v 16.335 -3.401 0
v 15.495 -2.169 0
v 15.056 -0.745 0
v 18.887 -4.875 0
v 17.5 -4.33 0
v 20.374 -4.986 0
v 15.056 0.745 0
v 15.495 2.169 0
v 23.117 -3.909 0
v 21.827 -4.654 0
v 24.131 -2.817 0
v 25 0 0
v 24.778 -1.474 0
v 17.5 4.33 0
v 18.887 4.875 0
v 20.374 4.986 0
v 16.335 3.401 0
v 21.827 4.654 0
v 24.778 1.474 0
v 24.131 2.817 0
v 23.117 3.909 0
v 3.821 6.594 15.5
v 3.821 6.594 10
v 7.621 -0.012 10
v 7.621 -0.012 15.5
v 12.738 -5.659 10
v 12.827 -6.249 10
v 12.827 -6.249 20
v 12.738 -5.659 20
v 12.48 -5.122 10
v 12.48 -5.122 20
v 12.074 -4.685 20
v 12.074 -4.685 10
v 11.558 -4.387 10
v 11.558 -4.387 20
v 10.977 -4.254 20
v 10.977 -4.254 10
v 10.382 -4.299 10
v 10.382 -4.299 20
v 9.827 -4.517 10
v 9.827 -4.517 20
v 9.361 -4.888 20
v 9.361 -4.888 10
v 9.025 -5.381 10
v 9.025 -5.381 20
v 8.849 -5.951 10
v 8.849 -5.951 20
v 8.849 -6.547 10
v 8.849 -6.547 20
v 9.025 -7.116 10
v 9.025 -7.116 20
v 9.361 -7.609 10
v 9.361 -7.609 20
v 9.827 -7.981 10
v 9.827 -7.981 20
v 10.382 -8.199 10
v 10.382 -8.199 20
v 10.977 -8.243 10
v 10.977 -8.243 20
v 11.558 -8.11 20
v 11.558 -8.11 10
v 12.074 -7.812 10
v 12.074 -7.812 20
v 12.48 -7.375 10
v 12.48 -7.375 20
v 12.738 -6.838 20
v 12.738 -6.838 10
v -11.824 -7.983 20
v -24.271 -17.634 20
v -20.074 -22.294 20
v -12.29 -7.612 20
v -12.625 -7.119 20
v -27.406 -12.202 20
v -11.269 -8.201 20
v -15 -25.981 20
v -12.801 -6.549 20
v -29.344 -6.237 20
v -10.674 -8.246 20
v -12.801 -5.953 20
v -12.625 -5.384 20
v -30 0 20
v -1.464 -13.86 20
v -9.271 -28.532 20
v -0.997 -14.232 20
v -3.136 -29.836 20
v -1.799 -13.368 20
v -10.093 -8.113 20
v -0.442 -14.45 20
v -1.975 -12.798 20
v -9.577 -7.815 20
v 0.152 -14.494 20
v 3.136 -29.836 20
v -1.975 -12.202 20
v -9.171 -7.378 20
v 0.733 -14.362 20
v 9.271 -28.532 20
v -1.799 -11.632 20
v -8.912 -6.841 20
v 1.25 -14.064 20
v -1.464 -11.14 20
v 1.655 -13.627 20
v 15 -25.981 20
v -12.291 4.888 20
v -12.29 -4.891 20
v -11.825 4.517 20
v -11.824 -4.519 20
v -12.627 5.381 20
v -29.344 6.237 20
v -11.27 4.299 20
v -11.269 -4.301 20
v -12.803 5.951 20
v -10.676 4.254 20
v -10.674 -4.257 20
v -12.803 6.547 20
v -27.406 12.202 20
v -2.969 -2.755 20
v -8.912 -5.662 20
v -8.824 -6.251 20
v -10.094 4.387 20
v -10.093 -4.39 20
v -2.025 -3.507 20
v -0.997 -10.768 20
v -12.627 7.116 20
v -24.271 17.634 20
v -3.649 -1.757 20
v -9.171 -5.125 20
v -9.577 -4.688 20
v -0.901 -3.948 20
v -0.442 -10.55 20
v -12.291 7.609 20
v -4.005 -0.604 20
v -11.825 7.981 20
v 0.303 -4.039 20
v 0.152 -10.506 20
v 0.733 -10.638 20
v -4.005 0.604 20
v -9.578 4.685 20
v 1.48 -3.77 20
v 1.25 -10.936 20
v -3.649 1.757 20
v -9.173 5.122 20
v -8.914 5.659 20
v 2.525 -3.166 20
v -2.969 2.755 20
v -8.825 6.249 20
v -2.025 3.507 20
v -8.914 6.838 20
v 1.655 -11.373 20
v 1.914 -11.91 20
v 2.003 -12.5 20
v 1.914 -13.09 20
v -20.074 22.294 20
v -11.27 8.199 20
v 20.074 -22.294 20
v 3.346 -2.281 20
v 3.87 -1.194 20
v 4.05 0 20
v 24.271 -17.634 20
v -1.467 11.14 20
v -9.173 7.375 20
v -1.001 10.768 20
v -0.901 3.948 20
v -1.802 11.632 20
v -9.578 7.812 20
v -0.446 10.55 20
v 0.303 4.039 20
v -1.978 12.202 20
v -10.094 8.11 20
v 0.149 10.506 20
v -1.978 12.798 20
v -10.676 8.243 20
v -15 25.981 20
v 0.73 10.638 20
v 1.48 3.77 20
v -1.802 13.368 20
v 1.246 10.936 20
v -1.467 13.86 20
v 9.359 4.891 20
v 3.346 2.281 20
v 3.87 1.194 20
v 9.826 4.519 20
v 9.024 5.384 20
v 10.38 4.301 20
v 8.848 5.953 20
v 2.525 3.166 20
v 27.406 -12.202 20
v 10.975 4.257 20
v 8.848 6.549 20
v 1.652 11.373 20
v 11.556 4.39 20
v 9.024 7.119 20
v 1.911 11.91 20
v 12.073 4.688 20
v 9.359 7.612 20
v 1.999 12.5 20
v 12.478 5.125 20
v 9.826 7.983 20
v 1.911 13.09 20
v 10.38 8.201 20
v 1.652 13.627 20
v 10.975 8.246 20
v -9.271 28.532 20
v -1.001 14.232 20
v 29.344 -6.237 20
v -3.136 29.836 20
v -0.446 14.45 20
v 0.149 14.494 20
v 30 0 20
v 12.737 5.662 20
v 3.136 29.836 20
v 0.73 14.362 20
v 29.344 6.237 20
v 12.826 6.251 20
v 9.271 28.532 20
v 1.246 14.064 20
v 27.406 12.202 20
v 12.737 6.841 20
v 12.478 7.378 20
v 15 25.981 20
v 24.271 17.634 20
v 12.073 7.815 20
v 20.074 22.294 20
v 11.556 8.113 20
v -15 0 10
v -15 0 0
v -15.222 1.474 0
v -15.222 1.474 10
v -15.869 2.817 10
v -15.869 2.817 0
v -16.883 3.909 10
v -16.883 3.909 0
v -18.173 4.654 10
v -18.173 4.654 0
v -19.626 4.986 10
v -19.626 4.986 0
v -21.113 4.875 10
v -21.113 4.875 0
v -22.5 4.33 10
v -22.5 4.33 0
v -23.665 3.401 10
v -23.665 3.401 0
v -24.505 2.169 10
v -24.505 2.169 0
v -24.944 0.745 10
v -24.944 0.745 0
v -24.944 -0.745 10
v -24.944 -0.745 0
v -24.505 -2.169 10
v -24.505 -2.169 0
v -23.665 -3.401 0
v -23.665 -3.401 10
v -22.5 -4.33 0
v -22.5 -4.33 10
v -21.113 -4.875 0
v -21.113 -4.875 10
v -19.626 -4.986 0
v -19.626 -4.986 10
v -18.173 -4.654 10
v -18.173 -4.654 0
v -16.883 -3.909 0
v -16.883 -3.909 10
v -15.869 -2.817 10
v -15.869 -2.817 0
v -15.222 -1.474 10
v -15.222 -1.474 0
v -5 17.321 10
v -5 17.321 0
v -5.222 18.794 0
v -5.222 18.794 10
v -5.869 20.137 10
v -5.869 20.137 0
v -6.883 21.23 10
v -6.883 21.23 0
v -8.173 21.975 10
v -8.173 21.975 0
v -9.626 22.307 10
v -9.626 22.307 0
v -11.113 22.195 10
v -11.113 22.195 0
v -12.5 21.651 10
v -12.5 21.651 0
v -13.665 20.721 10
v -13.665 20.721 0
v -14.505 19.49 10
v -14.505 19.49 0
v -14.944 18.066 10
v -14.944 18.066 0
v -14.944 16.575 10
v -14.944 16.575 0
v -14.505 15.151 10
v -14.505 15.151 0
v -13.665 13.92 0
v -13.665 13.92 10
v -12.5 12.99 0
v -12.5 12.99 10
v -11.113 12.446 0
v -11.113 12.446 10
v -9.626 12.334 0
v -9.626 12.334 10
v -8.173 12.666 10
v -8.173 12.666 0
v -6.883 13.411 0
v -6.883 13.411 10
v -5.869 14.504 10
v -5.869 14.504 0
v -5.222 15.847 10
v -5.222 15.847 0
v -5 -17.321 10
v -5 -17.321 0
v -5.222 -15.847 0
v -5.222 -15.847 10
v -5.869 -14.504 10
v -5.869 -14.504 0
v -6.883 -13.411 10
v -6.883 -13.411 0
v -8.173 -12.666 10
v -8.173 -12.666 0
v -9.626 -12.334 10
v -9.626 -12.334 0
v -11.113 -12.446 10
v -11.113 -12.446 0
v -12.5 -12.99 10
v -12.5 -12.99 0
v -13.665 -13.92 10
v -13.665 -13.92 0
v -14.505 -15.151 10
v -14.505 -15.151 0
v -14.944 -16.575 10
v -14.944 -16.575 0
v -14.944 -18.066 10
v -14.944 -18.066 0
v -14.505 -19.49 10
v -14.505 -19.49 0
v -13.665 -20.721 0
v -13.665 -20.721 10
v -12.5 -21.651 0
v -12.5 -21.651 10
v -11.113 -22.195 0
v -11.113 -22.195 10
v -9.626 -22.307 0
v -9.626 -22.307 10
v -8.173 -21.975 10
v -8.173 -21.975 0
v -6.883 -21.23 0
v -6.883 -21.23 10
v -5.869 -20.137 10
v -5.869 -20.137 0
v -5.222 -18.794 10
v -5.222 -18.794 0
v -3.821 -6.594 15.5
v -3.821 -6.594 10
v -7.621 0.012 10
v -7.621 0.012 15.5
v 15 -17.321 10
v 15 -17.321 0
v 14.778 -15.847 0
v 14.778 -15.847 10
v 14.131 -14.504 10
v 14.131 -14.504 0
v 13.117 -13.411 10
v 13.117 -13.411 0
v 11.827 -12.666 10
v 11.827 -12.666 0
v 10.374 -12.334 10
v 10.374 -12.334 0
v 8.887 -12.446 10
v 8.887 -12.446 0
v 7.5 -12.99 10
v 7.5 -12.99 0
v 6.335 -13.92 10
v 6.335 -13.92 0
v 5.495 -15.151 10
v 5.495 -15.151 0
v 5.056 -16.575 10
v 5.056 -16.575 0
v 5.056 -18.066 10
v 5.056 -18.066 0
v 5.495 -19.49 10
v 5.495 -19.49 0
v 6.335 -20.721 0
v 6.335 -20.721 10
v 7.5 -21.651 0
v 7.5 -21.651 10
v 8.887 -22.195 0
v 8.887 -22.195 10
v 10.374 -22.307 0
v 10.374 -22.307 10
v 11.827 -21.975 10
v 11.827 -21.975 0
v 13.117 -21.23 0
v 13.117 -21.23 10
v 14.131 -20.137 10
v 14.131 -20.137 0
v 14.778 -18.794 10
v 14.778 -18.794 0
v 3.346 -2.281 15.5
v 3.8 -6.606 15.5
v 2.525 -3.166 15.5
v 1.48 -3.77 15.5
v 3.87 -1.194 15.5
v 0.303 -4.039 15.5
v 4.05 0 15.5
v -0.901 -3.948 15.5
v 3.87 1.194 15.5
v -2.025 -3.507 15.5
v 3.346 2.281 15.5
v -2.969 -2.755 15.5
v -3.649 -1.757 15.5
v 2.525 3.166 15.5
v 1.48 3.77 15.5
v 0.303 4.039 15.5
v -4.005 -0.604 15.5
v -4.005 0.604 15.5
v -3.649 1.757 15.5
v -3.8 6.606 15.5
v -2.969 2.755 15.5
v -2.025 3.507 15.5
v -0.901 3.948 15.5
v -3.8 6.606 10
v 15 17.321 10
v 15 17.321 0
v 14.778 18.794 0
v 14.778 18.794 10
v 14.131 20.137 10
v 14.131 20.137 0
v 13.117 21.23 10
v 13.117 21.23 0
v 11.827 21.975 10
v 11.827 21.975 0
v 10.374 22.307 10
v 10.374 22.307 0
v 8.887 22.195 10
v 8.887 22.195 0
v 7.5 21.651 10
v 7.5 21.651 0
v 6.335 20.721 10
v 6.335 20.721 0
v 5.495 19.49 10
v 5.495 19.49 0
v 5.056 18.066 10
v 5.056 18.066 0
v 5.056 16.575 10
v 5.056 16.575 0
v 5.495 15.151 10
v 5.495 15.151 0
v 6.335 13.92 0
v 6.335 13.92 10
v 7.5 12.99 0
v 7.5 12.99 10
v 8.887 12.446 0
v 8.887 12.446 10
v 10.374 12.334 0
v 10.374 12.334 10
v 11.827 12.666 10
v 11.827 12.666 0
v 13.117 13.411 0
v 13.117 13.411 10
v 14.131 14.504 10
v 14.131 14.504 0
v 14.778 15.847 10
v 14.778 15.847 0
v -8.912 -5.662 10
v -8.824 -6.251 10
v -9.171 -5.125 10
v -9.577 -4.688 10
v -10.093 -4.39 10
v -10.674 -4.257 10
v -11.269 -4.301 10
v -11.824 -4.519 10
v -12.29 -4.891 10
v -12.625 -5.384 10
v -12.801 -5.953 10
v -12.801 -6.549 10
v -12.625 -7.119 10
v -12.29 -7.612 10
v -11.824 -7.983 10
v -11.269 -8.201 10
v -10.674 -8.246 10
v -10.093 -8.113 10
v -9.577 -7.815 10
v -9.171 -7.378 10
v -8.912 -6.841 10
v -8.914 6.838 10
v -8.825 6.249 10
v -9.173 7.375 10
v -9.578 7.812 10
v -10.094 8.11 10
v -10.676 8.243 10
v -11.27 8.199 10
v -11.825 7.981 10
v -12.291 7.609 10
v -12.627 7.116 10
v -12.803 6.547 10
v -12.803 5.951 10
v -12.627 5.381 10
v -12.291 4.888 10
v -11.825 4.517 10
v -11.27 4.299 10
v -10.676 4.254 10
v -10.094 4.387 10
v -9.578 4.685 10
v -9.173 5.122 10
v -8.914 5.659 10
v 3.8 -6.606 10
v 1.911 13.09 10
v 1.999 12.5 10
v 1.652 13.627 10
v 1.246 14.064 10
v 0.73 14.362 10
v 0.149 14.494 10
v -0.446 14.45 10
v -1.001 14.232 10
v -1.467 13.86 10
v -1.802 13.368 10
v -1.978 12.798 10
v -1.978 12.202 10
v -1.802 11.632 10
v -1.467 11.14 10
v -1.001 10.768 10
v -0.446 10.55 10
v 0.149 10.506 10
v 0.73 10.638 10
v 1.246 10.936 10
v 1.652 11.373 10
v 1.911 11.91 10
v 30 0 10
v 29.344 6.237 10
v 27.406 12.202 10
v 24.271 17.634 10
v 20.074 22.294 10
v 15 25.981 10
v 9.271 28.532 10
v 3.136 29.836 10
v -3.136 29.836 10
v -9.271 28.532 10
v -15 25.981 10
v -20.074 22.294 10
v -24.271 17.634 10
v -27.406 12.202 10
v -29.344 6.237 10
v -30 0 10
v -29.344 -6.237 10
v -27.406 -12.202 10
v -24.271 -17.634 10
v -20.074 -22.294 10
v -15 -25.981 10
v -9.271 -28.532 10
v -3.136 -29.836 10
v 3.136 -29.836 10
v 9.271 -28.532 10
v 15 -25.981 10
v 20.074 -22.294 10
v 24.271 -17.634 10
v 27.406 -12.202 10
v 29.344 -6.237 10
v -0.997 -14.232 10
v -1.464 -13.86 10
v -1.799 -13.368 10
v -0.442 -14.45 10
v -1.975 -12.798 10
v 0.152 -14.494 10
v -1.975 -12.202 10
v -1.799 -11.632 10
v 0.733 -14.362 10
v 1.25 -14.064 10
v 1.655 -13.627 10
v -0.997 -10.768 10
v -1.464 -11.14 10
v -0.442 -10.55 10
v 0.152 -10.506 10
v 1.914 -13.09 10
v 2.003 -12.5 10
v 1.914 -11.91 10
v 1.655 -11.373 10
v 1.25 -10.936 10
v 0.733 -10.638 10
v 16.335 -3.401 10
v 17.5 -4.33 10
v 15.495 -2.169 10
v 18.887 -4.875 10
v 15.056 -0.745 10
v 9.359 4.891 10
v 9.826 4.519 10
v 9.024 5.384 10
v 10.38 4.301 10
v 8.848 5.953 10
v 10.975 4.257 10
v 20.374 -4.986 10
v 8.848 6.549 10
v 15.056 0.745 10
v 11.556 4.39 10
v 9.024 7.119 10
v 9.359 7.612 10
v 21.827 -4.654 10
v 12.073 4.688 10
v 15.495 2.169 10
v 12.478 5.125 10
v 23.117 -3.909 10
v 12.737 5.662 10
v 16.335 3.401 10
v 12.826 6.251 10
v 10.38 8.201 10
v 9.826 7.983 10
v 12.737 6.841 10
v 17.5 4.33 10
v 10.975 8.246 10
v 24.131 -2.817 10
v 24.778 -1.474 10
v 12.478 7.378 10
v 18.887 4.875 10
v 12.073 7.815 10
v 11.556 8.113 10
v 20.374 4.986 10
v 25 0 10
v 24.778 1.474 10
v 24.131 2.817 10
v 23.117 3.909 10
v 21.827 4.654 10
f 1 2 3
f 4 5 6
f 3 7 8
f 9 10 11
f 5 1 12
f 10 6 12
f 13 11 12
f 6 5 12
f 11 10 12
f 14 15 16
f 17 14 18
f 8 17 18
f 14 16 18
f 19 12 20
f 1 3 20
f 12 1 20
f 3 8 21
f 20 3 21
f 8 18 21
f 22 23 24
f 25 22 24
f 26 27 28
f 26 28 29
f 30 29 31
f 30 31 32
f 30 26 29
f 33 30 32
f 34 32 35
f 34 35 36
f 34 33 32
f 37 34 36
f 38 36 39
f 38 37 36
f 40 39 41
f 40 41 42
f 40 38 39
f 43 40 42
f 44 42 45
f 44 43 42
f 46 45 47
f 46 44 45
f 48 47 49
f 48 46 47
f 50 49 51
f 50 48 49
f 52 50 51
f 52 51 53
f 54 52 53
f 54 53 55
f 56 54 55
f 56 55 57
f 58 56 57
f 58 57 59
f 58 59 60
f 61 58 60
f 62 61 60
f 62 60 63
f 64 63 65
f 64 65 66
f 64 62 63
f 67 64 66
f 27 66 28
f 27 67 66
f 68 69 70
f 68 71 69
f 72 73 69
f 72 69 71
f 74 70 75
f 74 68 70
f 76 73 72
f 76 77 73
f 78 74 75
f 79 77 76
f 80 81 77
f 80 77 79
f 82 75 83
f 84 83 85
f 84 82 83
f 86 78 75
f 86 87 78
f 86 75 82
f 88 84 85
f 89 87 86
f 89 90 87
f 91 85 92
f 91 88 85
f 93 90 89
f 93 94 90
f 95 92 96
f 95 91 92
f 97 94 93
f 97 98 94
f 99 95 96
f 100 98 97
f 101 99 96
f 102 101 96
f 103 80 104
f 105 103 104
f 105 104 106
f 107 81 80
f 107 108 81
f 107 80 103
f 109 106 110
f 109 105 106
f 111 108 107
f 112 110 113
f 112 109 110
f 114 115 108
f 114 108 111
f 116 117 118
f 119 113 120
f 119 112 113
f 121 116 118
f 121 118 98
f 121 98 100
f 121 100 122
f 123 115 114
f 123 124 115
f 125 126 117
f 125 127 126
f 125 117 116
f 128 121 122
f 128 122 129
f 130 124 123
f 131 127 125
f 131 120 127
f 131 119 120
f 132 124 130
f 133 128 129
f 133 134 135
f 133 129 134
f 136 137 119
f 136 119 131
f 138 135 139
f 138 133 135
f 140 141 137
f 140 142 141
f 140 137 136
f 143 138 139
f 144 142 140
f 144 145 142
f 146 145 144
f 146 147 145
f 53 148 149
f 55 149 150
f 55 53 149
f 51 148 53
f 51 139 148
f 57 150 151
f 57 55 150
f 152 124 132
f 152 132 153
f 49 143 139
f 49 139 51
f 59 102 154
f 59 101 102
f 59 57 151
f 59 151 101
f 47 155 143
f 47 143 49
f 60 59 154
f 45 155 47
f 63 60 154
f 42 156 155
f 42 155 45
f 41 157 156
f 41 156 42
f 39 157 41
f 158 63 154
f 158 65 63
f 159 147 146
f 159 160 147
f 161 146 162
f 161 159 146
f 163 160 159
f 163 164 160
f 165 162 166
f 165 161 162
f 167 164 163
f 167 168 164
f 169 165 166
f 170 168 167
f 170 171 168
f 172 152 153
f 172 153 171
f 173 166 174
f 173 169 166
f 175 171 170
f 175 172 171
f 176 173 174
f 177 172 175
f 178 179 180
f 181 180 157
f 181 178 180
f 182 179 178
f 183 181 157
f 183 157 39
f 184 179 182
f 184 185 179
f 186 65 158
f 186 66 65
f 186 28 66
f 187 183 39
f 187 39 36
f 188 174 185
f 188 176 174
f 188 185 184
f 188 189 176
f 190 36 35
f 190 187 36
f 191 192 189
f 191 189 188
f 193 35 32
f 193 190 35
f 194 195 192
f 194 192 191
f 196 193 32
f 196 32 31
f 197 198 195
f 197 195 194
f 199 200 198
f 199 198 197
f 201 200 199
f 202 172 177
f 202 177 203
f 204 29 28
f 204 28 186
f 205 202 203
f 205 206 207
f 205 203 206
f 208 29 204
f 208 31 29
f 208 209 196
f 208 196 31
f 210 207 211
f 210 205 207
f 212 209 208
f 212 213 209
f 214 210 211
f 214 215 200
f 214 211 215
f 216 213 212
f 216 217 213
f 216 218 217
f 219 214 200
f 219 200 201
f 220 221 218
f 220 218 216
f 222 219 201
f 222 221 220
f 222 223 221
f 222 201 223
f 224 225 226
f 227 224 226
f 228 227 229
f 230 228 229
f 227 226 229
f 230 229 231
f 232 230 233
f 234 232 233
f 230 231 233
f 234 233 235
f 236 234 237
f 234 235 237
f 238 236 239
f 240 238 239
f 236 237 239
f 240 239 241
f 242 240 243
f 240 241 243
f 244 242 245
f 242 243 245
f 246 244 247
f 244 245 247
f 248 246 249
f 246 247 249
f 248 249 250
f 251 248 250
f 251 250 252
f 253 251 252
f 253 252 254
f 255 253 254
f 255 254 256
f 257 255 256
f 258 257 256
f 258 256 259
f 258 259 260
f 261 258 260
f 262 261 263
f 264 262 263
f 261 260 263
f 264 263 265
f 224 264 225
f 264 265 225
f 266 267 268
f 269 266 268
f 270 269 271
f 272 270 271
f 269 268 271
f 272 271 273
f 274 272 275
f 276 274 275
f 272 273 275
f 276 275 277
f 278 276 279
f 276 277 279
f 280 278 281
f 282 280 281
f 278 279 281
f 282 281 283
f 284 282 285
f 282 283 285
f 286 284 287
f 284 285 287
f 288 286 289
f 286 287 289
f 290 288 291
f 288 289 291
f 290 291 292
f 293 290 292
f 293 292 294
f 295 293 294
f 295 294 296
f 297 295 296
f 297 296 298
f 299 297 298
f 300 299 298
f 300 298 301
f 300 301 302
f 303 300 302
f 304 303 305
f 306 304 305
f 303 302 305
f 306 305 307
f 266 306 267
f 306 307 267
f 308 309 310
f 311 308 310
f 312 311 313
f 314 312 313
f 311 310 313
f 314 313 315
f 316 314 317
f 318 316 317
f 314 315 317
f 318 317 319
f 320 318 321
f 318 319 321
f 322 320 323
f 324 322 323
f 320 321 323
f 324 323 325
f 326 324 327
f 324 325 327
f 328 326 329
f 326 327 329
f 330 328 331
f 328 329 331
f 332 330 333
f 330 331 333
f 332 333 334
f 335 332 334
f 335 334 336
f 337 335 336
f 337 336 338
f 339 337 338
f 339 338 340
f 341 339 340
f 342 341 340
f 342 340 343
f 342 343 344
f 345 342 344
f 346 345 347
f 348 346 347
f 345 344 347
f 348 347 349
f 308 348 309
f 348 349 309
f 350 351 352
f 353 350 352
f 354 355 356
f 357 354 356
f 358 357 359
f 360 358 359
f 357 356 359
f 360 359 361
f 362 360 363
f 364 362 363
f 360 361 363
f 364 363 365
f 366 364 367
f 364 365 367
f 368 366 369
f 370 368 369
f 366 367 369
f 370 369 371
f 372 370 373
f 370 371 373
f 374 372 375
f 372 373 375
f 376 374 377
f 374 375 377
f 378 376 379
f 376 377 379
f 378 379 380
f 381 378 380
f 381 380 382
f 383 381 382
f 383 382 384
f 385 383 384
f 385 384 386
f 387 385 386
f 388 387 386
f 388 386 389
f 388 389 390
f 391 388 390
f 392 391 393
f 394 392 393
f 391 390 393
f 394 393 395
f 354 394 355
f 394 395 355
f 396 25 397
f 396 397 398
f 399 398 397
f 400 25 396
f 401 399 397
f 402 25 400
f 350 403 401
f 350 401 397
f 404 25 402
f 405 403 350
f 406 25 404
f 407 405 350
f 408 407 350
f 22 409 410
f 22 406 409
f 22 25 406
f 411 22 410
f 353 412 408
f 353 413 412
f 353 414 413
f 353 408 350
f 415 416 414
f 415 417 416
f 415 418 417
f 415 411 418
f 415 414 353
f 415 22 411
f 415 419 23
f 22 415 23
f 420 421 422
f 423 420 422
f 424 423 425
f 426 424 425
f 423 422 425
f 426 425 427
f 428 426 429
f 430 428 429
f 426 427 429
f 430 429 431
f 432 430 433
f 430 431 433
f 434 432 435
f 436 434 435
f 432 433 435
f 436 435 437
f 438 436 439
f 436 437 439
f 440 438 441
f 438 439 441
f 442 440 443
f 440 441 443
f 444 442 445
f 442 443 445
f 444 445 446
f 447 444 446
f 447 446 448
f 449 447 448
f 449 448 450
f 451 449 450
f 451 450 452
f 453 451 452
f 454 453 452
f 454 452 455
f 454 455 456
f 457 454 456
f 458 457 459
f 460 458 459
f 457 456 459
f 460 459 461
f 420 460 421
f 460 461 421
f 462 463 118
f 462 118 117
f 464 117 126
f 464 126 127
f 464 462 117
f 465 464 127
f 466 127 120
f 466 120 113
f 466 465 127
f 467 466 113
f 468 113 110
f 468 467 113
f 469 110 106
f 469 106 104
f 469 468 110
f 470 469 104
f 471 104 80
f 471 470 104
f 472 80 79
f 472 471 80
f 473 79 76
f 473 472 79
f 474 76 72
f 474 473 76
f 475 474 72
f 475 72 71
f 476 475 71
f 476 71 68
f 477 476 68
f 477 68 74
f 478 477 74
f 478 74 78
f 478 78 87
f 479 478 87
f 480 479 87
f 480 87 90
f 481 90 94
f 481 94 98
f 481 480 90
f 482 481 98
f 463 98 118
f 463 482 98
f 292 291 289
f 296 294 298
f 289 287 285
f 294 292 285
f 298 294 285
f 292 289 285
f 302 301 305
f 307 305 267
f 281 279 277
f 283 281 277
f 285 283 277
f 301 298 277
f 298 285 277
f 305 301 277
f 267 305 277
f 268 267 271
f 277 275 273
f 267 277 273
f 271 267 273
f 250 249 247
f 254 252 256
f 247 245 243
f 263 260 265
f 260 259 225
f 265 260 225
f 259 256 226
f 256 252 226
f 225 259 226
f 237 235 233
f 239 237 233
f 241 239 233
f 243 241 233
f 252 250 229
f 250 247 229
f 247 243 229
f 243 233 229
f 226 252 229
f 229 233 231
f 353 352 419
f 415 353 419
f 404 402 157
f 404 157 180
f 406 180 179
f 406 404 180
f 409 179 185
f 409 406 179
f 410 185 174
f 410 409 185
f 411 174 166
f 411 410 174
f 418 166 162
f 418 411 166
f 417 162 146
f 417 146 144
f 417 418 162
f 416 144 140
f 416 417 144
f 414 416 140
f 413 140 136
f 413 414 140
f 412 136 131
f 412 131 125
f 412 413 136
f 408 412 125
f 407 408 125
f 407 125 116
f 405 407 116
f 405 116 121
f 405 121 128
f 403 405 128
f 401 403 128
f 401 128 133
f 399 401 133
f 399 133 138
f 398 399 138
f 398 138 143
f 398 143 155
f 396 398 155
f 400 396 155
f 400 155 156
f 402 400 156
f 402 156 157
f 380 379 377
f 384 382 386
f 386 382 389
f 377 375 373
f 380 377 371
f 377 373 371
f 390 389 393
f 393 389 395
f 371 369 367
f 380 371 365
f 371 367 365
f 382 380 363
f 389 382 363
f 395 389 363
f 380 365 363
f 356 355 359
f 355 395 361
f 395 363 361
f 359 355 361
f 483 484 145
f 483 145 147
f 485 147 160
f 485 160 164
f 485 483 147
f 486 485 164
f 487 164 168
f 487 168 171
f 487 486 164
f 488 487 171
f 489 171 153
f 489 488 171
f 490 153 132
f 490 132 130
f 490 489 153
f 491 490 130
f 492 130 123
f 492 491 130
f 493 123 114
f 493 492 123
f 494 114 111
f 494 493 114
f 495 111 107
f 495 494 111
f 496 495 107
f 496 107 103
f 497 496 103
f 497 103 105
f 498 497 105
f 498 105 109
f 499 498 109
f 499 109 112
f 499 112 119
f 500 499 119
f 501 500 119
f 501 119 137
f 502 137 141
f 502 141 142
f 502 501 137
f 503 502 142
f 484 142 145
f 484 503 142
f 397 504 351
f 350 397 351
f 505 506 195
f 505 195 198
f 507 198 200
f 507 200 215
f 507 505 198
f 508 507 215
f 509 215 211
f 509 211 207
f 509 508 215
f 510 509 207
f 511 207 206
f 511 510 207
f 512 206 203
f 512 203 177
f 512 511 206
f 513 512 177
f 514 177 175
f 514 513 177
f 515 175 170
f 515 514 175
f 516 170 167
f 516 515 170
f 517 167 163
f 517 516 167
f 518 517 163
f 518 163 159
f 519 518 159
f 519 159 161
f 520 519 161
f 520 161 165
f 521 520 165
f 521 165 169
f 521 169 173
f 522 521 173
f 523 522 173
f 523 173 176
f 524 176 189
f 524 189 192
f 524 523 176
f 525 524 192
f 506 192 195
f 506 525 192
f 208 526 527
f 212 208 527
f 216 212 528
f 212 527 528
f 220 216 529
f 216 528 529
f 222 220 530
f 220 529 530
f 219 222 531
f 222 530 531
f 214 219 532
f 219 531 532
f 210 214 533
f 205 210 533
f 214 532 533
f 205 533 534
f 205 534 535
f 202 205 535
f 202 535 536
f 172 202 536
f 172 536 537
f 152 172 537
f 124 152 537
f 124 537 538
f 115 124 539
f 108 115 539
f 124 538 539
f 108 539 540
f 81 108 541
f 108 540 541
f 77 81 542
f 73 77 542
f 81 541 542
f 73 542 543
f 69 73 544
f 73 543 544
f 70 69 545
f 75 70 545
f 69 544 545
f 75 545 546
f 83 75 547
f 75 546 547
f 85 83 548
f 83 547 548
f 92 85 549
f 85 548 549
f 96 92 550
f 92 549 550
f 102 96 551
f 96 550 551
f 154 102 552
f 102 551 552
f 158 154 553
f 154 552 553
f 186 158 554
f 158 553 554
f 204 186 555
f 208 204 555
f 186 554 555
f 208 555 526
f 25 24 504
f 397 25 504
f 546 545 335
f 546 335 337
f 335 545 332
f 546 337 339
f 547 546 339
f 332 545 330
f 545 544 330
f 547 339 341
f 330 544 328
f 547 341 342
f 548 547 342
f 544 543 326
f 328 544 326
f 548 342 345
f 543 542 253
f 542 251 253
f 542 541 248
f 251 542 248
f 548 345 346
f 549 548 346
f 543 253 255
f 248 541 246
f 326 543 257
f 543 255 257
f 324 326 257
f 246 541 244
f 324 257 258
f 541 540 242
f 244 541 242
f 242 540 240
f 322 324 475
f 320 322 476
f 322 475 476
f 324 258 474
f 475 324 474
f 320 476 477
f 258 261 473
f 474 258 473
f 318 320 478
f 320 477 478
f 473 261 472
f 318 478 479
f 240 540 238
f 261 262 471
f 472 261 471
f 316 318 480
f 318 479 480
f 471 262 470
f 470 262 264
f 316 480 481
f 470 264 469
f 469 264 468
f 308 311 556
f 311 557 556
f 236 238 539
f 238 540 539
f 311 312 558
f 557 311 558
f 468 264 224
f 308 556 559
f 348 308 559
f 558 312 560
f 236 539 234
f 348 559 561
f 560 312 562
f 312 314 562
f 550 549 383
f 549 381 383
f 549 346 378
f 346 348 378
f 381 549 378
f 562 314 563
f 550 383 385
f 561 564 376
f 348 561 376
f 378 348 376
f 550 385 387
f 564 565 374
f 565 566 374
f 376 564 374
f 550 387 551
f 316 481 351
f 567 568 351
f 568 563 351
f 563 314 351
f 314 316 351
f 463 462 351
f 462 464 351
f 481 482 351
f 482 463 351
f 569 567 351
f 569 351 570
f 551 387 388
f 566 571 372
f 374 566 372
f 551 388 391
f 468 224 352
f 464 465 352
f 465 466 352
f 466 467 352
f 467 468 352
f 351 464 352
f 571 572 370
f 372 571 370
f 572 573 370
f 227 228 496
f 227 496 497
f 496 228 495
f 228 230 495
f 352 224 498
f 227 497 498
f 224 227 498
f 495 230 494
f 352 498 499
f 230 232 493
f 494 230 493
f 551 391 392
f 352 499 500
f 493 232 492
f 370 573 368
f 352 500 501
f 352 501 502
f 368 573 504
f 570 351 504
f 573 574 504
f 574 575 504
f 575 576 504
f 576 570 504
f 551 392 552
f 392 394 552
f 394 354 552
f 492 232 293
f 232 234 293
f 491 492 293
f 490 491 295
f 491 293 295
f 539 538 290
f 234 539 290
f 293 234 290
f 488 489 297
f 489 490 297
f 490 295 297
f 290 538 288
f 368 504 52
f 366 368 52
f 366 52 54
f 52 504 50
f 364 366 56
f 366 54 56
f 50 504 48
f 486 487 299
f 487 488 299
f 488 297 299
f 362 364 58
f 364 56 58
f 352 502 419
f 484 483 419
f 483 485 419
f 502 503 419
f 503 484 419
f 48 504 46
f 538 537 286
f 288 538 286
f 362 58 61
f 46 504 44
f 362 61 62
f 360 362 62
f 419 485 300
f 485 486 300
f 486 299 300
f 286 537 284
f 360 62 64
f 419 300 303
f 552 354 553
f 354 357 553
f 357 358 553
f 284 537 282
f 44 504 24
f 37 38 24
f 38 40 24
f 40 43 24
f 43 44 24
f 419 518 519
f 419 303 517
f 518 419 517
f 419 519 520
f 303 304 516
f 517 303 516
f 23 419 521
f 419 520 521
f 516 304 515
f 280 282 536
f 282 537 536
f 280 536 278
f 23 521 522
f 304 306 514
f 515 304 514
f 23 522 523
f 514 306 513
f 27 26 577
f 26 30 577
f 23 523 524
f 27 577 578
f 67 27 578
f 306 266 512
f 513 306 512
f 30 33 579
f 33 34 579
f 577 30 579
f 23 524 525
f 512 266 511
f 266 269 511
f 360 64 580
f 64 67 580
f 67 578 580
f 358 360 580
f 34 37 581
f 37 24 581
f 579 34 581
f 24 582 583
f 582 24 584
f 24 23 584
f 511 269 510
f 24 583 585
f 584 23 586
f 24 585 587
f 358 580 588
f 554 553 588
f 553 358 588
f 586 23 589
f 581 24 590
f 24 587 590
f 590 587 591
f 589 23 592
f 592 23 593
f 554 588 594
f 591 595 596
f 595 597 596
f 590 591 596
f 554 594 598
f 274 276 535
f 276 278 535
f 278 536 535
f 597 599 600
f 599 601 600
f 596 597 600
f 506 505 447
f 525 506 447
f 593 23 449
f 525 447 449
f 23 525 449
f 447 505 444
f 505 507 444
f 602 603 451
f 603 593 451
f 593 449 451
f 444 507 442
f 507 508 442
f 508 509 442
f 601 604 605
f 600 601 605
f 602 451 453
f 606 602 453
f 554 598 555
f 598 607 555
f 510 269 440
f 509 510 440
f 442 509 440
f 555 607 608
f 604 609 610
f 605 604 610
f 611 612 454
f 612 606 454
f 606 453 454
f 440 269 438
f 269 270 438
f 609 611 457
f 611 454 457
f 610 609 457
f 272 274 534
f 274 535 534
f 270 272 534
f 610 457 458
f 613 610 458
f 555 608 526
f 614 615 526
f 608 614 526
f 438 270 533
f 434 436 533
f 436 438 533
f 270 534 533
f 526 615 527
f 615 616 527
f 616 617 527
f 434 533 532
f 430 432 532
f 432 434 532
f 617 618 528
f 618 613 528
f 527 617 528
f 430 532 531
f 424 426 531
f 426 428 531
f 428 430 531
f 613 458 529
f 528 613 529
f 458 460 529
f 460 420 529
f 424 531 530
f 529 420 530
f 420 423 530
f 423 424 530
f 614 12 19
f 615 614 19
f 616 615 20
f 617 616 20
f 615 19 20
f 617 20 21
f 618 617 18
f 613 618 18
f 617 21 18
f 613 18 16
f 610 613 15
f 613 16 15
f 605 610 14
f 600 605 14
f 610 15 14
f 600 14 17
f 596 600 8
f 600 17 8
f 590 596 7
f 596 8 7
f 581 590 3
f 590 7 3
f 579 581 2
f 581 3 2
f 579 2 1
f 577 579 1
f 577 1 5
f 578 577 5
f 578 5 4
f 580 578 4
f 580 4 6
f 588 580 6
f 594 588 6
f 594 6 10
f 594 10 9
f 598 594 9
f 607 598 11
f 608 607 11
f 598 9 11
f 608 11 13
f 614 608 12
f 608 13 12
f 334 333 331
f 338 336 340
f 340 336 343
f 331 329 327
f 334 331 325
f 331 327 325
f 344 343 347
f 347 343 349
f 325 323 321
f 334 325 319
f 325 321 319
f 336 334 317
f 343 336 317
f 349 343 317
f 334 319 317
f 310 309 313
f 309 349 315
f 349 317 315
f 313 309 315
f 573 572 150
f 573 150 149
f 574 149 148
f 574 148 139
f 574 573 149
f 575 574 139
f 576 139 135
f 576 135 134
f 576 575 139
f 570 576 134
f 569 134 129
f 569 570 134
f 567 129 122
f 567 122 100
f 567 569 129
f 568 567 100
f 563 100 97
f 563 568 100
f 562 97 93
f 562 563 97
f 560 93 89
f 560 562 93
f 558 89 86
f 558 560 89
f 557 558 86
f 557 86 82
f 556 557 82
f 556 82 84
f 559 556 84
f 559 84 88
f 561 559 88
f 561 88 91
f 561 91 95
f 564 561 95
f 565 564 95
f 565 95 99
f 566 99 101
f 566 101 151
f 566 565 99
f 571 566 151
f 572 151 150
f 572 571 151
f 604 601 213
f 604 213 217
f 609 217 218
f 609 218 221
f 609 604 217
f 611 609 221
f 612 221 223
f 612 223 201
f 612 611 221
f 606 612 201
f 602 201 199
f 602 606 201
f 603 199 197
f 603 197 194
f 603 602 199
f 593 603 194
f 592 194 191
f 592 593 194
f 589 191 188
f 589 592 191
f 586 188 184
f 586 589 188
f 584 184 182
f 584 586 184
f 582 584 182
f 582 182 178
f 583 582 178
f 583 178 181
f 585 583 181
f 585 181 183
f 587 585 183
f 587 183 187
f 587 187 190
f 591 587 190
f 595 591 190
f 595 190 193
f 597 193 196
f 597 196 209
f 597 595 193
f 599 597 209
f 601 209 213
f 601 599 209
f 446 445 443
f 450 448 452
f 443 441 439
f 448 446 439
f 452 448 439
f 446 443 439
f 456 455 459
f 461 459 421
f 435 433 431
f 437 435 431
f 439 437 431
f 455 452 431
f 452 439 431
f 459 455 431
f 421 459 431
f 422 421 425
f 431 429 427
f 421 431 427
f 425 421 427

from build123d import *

# Parameters (mm, degrees)
SKETCH1_R             = 5
BOSS_EXTRUDE1_DEPTH   = 10
BOSS_EXTRUDE1_2_DEPTH = 10
BOSS_EXTRUDE1_3_DEPTH = 10
BOSS_EXTRUDE1_4_DEPTH = 10
BOSS_EXTRUDE1_5_DEPTH = 10
BOSS_EXTRUDE1_6_DEPTH = 10
SKETCH2_R             = 30
SKETCH2_R_2           = 4.05
SKETCH2_R_3           = 2
BOSS_EXTRUDE2_DEPTH   = 10
CUT_EXTRUDE1_DEPTH    = 5.5


with BuildPart() as part:
    # Sketch1 → Boss-Extrude1 (new body)
    with BuildSketch(Plane.XY):
        with Locations((20, 0)):
            Circle(SKETCH1_R)
    extrude(amount=BOSS_EXTRUDE1_DEPTH)



with BuildPart() as body_2:
    # Sketch1 → Boss-Extrude1 2 (new body)
    with BuildSketch(Plane.XY):
        with Locations((10, -17.320508076)):
            Circle(SKETCH1_R)
    extrude(amount=BOSS_EXTRUDE1_2_DEPTH)


with BuildPart() as body_3:
    # Sketch1 → Boss-Extrude1 3 (new body)
    with BuildSketch(Plane.XY):
        with Locations((-10, -17.320508076)):
            Circle(SKETCH1_R)
    extrude(amount=BOSS_EXTRUDE1_3_DEPTH)


with BuildPart() as body_4:
    # Sketch1 → Boss-Extrude1 4 (new body)
    with BuildSketch(Plane.XY):
        with Locations((-20, 0)):
            Circle(SKETCH1_R)
    extrude(amount=BOSS_EXTRUDE1_4_DEPTH)


with BuildPart() as body_5:
    # Sketch1 → Boss-Extrude1 5 (new body)
    with BuildSketch(Plane.XY):
        with Locations((-10, 17.320508076)):
            Circle(SKETCH1_R)
    extrude(amount=BOSS_EXTRUDE1_5_DEPTH)


with BuildPart() as body_6:
    # Sketch1 → Boss-Extrude1 6 (new body)
    with BuildSketch(Plane.XY):
        with Locations((10, 17.320508076)):
            Circle(SKETCH1_R)
    extrude(amount=BOSS_EXTRUDE1_6_DEPTH)


with BuildPart() as part_1:
    add(part.part)

    add(body_2.part)  # Boss-Extrude2 merges body 2

    add(body_3.part)  # Boss-Extrude2 merges body 3

    add(body_4.part)  # Boss-Extrude2 merges body 4

    add(body_5.part)  # Boss-Extrude2 merges body 5

    add(body_6.part)  # Boss-Extrude2 merges body 6
    # Sketch2 → Boss-Extrude2 (add)
    with BuildSketch(Plane.XY.offset(10)):
        Circle(SKETCH2_R)
        Circle(SKETCH2_R_2, mode=Mode.SUBTRACT)
        with Locations((-0.00055318, 12.499999988)):
            Circle(SKETCH2_R_3, mode=Mode.SUBTRACT)
        with Locations((10.825540946, 6.251345088)):
            Circle(SKETCH2_R_3, mode=Mode.SUBTRACT)
        with Locations((10.827094127, -6.2486549)):
            Circle(SKETCH2_R_3, mode=Mode.SUBTRACT)
        with Locations((0.00255318, -12.499999988)):
            Circle(SKETCH2_R_3, mode=Mode.SUBTRACT)
        with Locations((-10.823540946, -6.251345088)):
            Circle(SKETCH2_R_3, mode=Mode.SUBTRACT)
        with Locations((-10.825094127, 6.2486549)):
            Circle(SKETCH2_R_3, mode=Mode.SUBTRACT)
    extrude(amount=BOSS_EXTRUDE2_DEPTH)

    # Sketch5 → Cut-Extrude1 (cut)
    with BuildSketch(Plane(origin=(0, 0, 10), x_dir=(-1, 0, 0), z_dir=(0, 0, -1))):
        Polygon((7.621014042, 0.012040338), (3.800079783, 6.606011932), (-3.82093426, 6.593971594), (-7.621014042, -0.012040338), (-3.800079783, -6.606011932), (3.82093426, -6.593971594), align=None)
    extrude(amount=-CUT_EXTRUDE1_DEPTH, mode=Mode.SUBTRACT)


solid = part_1.part
